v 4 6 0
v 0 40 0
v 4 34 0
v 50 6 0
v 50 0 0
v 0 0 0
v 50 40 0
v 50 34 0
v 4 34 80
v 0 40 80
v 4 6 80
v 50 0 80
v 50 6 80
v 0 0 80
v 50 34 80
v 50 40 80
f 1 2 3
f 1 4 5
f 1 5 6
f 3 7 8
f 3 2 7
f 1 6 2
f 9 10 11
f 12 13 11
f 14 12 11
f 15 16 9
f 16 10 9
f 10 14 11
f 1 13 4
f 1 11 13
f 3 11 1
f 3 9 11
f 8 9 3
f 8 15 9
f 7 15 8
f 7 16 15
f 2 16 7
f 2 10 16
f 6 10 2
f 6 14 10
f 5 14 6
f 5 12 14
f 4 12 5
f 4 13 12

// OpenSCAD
$fn = 32;

// ----------------------------------------------------------------------
// Structural section: channel 50 x 40 mm
// ----------------------------------------------------------------------

// --- parameters (mm) ---
sec_w = 50;               // channel width, X
sec_h = 40;               // channel height, Y
flange_t = 6;             // flange thickness
web_t = 4;                // web thickness
plate_t = 80;             // cut length, Z (extrusion height)

profile = [[0, 0], [50, 0], [50, 6], [4, 6], [4, 34], [50, 34], [50, 40], [0, 40]];  // primary outline, 8 points, counter clockwise

// --- the one profile operation ---
linear_extrude(height = plate_t) polygon(points = profile);
